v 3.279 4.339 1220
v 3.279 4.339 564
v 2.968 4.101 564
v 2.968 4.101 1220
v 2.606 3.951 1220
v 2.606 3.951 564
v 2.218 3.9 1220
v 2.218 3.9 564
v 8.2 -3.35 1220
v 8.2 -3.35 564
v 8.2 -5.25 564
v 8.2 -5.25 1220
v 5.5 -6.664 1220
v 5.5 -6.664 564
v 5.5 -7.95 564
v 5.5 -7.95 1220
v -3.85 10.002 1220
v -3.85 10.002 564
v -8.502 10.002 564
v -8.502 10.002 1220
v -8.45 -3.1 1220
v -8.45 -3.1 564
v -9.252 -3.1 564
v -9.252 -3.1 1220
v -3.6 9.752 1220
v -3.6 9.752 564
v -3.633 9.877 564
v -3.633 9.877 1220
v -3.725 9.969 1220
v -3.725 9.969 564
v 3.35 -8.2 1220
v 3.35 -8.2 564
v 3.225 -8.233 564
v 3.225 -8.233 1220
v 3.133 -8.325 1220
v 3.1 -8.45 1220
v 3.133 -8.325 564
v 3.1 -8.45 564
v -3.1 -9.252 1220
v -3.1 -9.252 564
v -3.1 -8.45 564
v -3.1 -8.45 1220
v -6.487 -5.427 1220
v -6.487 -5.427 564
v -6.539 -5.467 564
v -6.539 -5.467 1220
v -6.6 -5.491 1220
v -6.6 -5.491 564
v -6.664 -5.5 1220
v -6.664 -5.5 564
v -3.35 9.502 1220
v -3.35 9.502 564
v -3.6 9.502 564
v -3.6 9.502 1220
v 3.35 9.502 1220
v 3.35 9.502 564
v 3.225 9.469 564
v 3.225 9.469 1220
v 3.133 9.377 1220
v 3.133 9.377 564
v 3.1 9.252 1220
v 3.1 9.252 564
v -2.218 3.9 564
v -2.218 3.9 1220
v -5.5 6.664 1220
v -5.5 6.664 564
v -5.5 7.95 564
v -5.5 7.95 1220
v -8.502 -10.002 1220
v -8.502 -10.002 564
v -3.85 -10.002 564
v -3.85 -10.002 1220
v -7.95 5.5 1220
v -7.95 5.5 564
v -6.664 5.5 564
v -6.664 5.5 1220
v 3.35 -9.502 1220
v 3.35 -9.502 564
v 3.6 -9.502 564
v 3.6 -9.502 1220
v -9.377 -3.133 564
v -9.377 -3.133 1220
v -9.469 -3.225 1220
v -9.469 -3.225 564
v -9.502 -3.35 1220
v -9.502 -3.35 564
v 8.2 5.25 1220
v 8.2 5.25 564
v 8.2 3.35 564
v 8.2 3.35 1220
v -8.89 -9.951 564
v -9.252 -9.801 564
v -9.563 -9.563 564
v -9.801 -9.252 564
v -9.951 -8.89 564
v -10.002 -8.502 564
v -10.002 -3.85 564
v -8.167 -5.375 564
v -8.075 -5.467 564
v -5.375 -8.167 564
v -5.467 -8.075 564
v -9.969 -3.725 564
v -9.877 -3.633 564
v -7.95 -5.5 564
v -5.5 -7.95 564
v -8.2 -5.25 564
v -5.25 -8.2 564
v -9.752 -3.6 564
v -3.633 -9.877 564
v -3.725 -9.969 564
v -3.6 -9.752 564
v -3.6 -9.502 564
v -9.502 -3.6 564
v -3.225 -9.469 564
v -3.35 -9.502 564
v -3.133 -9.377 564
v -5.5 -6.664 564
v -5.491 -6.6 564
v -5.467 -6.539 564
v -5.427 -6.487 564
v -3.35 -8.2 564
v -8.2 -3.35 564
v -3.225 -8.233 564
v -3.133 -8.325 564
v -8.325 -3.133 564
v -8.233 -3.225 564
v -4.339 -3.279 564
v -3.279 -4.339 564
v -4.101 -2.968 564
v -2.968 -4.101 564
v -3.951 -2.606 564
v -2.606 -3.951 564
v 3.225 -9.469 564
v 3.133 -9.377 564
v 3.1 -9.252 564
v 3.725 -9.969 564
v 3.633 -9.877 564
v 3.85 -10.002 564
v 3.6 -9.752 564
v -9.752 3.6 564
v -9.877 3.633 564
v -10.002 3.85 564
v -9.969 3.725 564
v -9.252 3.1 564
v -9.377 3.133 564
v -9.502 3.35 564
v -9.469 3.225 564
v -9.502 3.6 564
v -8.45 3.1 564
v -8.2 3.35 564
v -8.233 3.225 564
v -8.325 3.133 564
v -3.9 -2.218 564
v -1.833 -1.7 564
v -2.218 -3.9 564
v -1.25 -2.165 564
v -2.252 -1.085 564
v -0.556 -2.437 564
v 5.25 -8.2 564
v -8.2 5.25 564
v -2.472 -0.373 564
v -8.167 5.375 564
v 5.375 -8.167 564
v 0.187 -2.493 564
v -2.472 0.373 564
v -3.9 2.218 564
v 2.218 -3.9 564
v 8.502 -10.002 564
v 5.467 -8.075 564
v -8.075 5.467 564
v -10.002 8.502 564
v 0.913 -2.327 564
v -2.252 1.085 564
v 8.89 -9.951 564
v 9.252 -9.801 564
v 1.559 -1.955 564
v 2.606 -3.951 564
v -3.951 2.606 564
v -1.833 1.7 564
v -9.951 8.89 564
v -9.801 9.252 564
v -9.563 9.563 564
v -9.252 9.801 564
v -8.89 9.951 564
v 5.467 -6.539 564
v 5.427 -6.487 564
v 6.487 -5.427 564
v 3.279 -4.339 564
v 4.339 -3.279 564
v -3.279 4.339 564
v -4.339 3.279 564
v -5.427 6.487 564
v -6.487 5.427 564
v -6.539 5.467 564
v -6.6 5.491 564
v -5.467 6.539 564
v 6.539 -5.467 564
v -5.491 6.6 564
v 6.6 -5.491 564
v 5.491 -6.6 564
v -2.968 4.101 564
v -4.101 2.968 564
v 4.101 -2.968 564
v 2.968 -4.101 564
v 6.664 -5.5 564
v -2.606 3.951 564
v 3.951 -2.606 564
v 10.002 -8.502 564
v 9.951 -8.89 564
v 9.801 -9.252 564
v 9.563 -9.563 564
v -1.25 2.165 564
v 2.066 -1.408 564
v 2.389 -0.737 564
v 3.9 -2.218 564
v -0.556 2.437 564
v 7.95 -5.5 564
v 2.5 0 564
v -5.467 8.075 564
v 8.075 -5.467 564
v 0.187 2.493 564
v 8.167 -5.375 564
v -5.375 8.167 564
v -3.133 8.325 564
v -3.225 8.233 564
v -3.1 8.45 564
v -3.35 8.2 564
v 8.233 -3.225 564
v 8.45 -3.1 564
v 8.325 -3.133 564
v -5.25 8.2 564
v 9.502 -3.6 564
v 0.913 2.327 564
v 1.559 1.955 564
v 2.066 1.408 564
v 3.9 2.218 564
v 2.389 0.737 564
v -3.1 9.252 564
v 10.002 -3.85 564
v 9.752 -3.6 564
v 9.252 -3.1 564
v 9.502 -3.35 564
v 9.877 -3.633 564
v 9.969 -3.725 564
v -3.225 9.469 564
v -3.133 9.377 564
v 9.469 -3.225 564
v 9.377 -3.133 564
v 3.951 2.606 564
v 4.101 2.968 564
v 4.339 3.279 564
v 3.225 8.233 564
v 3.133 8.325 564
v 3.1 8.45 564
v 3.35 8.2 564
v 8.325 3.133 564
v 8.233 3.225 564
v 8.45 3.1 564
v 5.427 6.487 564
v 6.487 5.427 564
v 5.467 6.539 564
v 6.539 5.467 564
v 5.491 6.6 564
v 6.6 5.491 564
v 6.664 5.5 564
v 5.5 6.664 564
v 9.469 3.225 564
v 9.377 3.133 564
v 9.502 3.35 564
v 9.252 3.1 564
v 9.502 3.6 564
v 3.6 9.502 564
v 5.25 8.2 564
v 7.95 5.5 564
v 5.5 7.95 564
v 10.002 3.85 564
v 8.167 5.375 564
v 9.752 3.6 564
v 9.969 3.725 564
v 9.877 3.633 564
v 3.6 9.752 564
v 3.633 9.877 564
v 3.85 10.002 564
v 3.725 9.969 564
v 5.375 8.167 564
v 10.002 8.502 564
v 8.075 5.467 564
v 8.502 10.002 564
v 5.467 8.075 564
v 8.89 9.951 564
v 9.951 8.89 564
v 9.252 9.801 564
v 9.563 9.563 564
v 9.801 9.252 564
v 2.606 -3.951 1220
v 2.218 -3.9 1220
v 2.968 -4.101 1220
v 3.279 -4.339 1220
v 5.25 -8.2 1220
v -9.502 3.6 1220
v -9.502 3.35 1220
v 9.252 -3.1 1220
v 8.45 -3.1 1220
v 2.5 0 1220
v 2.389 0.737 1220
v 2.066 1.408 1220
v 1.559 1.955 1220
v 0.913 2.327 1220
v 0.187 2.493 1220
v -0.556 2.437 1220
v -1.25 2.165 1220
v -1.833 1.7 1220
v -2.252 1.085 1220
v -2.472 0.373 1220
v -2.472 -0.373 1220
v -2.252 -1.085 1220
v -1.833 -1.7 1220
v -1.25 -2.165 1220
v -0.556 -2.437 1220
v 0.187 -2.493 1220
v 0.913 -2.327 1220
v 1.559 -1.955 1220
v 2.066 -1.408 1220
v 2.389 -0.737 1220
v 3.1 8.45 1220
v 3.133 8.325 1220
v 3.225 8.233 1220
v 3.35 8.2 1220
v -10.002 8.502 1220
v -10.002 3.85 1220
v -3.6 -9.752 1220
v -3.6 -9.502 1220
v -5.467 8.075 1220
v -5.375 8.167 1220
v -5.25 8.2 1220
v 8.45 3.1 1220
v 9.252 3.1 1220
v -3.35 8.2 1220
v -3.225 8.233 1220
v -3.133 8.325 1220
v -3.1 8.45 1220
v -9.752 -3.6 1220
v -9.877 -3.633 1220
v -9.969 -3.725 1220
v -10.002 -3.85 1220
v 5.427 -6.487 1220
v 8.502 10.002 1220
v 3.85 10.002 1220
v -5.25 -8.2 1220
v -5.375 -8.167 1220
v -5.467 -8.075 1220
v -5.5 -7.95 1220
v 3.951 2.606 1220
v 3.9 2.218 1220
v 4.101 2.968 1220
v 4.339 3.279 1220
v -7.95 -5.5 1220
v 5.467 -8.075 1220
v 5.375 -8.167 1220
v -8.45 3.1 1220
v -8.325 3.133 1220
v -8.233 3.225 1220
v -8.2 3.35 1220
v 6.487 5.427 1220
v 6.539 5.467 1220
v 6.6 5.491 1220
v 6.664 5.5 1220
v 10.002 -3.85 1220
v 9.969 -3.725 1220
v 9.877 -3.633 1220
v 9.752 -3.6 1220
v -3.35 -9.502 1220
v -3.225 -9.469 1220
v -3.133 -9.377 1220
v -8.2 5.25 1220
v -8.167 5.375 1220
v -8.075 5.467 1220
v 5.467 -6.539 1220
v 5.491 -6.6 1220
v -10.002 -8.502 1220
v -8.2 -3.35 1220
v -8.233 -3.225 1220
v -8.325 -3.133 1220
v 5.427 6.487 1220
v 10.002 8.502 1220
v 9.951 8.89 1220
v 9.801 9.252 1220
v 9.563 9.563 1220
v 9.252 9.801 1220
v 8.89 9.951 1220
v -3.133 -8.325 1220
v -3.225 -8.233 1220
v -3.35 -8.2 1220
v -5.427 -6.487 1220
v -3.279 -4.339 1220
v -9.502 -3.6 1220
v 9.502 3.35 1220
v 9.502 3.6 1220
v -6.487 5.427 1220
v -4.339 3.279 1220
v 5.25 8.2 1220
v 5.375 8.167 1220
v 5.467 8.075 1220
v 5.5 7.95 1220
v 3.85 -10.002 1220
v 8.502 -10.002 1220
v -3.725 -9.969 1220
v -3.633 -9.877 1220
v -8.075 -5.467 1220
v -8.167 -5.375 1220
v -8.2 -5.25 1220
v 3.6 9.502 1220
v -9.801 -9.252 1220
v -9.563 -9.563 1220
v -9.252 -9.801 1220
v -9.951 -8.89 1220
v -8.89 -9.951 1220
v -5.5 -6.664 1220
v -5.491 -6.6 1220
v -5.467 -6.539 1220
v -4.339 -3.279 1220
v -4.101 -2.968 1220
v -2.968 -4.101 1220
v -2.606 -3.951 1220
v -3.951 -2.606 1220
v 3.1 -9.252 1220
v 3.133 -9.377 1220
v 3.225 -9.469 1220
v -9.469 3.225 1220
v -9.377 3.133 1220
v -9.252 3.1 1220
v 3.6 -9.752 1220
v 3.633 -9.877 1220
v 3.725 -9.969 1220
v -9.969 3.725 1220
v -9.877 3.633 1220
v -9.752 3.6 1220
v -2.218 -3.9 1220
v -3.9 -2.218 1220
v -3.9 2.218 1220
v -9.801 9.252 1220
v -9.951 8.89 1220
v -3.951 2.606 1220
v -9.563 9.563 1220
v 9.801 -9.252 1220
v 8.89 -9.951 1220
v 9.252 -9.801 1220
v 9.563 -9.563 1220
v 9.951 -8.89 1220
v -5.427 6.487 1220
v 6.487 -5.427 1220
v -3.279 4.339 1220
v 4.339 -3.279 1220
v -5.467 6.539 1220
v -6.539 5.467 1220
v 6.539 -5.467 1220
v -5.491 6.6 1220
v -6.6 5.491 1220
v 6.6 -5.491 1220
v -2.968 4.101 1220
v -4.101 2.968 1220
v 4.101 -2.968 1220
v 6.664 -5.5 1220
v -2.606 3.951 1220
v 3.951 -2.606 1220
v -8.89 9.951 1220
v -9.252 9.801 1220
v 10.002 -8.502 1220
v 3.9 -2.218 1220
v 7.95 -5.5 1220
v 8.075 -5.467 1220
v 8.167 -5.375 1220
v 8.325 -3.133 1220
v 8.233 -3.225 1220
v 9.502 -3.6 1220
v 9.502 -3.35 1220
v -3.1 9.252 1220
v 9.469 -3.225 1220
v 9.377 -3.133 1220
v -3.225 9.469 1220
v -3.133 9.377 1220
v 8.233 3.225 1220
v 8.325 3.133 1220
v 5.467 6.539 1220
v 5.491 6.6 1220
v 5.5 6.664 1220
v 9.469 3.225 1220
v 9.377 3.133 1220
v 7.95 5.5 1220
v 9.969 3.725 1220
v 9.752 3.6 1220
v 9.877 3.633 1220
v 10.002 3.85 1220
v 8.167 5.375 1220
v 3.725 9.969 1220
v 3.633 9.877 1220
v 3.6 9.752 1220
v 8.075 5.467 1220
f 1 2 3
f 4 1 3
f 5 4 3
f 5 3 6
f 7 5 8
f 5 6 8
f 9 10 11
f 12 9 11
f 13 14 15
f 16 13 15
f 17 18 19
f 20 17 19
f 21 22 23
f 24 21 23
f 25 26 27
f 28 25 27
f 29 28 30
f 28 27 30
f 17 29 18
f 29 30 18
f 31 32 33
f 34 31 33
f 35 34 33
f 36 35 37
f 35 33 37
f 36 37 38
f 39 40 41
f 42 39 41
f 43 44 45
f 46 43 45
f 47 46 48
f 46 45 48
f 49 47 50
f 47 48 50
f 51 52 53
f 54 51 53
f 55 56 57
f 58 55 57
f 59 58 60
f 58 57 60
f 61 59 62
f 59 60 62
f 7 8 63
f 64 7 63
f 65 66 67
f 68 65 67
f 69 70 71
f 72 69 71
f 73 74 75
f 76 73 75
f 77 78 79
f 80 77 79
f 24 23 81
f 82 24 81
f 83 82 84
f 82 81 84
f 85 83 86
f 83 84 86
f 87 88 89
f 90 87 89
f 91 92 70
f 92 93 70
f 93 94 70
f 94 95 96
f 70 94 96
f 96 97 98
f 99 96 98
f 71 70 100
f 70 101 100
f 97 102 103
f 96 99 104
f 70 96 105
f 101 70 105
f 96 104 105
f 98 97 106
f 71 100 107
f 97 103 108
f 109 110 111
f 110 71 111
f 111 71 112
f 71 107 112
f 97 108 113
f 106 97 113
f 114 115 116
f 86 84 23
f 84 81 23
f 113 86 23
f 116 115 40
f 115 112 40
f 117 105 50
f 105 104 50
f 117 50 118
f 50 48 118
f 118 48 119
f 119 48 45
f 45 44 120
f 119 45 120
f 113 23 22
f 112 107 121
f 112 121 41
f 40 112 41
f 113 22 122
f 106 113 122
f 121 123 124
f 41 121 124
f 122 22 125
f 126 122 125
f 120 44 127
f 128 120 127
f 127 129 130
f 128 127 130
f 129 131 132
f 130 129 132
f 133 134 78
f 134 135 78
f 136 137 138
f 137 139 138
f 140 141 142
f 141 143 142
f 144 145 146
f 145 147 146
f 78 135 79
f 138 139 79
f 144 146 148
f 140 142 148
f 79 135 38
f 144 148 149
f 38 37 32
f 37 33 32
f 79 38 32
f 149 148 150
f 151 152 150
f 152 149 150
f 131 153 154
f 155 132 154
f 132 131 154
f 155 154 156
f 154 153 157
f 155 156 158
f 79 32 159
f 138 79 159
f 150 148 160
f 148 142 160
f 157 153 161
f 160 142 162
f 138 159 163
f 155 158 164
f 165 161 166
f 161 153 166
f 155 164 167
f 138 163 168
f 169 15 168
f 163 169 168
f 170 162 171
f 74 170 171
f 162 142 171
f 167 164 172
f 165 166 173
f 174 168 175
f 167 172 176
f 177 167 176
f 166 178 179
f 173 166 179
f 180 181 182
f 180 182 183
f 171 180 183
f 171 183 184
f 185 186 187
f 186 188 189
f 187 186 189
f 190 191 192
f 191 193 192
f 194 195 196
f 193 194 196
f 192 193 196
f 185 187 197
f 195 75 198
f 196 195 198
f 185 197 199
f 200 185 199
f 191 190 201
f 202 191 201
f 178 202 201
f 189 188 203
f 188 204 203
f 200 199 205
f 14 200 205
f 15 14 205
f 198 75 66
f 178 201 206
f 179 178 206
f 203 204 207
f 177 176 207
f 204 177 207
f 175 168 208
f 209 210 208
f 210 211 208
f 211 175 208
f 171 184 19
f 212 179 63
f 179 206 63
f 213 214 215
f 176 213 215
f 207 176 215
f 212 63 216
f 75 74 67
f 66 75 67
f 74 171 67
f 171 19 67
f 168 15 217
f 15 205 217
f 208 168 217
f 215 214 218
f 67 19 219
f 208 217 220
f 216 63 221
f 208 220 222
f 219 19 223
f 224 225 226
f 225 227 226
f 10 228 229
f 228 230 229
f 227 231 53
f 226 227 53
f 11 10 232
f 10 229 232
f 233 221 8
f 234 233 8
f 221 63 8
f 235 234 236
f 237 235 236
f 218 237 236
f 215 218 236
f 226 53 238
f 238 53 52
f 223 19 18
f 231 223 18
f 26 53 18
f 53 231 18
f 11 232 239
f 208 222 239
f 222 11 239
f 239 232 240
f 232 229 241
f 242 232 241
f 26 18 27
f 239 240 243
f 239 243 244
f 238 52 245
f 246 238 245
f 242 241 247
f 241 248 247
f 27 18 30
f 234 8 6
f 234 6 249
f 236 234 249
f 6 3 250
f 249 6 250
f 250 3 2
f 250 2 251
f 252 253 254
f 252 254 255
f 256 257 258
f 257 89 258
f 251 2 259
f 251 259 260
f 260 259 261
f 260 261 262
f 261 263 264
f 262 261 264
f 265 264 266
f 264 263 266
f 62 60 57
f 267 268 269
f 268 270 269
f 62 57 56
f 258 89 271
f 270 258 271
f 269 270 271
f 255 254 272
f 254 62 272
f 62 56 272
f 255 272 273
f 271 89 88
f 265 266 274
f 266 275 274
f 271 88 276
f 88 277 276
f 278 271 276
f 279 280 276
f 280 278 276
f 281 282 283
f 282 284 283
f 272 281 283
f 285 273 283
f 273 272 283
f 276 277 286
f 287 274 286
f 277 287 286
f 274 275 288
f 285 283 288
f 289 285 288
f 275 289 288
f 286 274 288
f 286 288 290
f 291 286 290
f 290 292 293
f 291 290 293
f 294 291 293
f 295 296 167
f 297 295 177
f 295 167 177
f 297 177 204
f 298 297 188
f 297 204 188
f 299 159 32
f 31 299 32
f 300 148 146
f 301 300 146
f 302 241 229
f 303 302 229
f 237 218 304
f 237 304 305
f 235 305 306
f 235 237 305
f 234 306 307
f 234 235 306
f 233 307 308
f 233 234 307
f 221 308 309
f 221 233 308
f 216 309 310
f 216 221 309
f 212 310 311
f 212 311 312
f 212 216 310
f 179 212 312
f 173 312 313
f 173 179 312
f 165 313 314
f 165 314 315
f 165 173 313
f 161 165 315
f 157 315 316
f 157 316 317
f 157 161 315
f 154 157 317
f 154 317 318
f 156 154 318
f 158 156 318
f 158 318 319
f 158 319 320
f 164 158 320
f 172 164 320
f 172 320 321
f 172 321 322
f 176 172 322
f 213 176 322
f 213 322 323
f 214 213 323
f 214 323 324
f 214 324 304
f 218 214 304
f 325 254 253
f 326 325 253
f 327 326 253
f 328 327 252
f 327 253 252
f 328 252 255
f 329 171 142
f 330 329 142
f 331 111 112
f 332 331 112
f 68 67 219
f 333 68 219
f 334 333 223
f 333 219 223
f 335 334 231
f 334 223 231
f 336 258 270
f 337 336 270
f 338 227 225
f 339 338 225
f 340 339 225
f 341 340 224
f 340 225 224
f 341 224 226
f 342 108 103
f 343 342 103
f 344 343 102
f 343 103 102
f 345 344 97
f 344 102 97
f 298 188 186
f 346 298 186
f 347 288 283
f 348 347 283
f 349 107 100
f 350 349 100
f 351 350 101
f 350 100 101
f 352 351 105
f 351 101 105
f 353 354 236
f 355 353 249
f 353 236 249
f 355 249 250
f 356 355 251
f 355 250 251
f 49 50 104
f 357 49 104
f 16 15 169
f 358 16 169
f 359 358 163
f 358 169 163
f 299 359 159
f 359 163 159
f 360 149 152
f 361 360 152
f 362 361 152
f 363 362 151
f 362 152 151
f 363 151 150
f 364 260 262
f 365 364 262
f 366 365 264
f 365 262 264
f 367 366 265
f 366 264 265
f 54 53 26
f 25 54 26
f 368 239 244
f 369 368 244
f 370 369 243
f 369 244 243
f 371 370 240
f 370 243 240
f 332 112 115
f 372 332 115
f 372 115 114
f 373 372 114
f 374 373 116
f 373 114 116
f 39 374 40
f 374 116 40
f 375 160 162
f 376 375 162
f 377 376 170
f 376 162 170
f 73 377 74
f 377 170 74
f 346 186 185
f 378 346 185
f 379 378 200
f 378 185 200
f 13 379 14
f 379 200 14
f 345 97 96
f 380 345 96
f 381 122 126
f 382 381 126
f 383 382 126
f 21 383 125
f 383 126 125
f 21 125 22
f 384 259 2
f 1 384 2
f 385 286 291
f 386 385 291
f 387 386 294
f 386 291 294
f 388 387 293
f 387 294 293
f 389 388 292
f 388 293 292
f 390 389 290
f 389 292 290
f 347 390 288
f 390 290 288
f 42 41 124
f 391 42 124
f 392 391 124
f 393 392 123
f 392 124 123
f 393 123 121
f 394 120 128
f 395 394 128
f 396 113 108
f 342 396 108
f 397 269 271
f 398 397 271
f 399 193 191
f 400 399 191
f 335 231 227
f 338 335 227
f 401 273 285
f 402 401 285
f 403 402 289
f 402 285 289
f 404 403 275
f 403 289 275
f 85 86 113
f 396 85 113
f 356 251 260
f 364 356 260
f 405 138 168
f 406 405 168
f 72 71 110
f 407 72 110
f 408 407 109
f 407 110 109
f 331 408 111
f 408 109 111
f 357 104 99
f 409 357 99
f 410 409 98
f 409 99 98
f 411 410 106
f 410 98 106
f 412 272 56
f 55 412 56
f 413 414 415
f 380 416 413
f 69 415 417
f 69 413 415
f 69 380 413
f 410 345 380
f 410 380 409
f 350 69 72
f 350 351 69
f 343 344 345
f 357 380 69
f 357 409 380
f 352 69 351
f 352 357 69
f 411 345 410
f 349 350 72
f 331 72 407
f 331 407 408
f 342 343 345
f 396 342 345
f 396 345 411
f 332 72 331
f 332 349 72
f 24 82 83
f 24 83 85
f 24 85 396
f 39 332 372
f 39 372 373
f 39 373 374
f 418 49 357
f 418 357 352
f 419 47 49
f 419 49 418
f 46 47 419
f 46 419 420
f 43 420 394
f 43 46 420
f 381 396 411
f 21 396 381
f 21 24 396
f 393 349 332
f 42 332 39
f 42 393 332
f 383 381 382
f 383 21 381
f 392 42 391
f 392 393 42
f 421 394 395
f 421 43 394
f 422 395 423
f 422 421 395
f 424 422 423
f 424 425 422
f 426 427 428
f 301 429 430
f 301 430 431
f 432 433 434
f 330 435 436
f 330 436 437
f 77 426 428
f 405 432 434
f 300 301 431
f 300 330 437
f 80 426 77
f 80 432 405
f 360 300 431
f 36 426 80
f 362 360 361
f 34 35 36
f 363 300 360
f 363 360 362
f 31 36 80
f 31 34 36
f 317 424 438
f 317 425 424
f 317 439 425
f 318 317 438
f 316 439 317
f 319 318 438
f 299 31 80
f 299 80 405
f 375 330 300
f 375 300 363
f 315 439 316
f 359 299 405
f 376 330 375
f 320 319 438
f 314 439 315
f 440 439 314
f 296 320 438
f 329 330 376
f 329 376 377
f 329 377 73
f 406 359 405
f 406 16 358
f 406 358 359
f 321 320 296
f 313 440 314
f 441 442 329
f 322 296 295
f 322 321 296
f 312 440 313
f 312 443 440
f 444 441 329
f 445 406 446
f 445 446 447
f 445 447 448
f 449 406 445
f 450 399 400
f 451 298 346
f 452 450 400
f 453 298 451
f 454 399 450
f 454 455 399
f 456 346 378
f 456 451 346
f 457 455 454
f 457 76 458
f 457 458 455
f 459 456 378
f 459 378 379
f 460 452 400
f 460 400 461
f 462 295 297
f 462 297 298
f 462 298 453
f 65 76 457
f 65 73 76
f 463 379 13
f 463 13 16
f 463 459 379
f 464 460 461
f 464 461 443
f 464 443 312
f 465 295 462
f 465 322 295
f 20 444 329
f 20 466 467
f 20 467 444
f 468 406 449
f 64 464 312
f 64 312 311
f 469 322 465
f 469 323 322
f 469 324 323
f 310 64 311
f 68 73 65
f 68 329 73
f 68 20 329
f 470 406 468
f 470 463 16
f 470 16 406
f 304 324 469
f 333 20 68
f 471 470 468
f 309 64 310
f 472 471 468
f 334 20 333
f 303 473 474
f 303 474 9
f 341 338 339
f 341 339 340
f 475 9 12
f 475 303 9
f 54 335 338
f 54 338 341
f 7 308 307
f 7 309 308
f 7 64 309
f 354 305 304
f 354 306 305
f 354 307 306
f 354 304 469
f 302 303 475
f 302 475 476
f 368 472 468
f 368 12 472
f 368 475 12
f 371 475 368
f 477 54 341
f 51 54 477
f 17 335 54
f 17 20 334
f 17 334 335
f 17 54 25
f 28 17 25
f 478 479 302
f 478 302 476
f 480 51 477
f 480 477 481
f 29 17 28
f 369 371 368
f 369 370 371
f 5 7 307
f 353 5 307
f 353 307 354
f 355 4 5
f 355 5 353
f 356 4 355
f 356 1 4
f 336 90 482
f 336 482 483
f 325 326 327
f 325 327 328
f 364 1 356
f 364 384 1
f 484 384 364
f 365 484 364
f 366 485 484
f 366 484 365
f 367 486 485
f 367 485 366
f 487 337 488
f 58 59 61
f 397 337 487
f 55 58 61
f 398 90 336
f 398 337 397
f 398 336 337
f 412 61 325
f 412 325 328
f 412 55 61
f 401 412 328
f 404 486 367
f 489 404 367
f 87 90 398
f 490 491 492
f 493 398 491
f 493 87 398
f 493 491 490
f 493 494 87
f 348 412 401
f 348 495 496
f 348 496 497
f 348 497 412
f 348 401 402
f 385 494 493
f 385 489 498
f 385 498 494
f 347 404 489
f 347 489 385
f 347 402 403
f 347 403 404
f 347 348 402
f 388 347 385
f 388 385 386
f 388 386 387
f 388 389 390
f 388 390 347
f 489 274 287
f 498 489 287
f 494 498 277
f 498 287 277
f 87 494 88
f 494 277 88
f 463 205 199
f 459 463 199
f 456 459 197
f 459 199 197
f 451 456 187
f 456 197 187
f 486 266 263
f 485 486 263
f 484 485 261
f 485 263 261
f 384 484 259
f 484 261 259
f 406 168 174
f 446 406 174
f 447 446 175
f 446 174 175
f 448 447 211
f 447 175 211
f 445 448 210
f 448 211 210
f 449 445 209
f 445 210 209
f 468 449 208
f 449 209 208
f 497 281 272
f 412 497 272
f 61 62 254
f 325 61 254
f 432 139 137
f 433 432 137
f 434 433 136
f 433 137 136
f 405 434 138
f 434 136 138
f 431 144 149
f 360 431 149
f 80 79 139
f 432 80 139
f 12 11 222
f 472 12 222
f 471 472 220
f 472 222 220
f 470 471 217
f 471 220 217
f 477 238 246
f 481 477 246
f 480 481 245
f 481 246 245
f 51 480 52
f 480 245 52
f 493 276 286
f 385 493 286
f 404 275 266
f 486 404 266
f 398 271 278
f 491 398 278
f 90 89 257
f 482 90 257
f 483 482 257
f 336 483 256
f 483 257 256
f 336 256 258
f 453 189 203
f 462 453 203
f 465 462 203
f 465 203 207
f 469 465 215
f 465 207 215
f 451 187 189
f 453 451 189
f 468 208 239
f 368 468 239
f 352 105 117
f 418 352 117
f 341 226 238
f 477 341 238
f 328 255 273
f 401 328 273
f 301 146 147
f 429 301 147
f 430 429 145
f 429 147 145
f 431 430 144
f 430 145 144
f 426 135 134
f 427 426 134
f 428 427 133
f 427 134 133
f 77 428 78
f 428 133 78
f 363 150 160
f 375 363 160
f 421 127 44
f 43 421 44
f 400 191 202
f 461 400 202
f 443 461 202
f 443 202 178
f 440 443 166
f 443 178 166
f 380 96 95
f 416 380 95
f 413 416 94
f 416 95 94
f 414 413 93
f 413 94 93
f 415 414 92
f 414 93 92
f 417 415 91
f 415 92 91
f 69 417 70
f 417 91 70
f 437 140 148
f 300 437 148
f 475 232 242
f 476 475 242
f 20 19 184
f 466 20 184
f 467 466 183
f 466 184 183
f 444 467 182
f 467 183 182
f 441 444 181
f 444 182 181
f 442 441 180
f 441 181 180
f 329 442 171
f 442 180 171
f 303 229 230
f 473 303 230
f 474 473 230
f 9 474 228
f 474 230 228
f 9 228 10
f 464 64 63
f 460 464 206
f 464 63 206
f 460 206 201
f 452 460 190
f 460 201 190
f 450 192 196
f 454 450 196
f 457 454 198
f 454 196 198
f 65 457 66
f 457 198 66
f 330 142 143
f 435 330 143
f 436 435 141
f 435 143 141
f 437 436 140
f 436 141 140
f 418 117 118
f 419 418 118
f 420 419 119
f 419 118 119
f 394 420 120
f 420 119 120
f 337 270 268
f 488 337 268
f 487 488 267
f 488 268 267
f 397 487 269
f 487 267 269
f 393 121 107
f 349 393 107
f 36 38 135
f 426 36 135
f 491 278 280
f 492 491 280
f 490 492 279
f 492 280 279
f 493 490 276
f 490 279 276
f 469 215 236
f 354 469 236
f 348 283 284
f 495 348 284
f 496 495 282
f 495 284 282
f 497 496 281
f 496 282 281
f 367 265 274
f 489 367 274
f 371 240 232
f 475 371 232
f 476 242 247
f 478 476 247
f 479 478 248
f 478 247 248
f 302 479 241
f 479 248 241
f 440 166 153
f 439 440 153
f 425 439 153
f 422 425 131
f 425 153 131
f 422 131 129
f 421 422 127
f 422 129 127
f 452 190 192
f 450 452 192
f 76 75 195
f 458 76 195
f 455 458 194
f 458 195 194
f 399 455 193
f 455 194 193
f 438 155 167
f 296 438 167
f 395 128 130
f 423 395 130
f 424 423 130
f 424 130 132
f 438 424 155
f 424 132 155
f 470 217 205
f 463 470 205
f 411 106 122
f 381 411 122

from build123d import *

# Parameters (mm, degrees)
SKETCH_1_R         = 2.5
EXTRUDE_1_DEPTH    = 1220
SKETCH1_R          = 16.771487081
CUT_EXTRUDE1_DEPTH = 565


with BuildPart() as part:
    # 草图1 → 凸台-拉伸1 (new body)
    with BuildSketch(Plane.XY):
        with BuildLine():
            Line((-8.502261885, -10.002261885), (-3.85, -10.002261885))
            ThreePointArc((-3.85, -10.002261885), (-3.673223305, -9.929038581), (-3.6, -9.752261885))
            Line((-3.6, -9.752261885), (-3.6, -9.502261885))
            Line((-3.6, -9.502261885), (-3.35, -9.502261885))
            ThreePointArc((-3.35, -9.502261885), (-3.173223305, -9.429038581), (-3.1, -9.252261885))
            Line((-3.1, -9.252261885), (-3.1, -8.45))
            ThreePointArc((-3.1, -8.45), (-3.173223305, -8.273223305), (-3.35, -8.2))
            Line((-3.35, -8.2), (-5.25, -8.2))
            ThreePointArc((-5.25, -8.2), (-5.426776695, -8.126776695), (-5.5, -7.95))
            Line((-5.5, -7.95), (-5.5, -6.664213562))
            ThreePointArc((-5.5, -6.664213562), (-5.480969883, -6.568542704), (-5.426776695, -6.487436867))
            Line((-5.426776695, -6.487436867), (-3.278679656, -4.339339828))
            ThreePointArc((-3.278679656, -4.339339828), (-2.792044633, -4.014180701), (-2.218019485, -3.9))
            Line((-2.218019485, -3.9), (2.218019485, -3.9))
            ThreePointArc((2.218019485, -3.9), (2.792044633, -4.014180701), (3.278679656, -4.339339828))
            Line((3.278679656, -4.339339828), (5.426776695, -6.487436867))
            ThreePointArc((5.426776695, -6.487436867), (5.480969883, -6.568542704), (5.5, -6.664213562))
            Line((5.5, -6.664213562), (5.5, -7.95))
            ThreePointArc((5.5, -7.95), (5.426776695, -8.126776695), (5.25, -8.2))
            Line((5.25, -8.2), (3.35, -8.2))
            ThreePointArc((3.35, -8.2), (3.173223305, -8.273223305), (3.1, -8.45))
            Line((3.1, -8.45), (3.1, -9.252261885))
            ThreePointArc((3.1, -9.252261885), (3.173223305, -9.429038581), (3.35, -9.502261885))
            Line((3.35, -9.502261885), (3.6, -9.502261885))
            Line((3.6, -9.502261885), (3.6, -9.752261885))
            ThreePointArc((3.6, -9.752261885), (3.673223305, -9.929038581), (3.85, -10.002261885))
            Line((3.85, -10.002261885), (8.502261885, -10.002261885))
            ThreePointArc((8.502261885, -10.002261885), (9.562922057, -9.562922057), (10.002261885, -8.502261885))
            Line((10.002261885, -8.502261885), (10.002261885, -3.85))
            ThreePointArc((10.002261885, -3.85), (9.929038581, -3.673223305), (9.752261885, -3.6))
            Line((9.752261885, -3.6), (9.502261885, -3.6))
            Line((9.502261885, -3.6), (9.502261885, -3.35))
            ThreePointArc((9.502261885, -3.35), (9.429038581, -3.173223305), (9.252261885, -3.1))
            Line((9.252261885, -3.1), (8.45, -3.1))
            ThreePointArc((8.45, -3.1), (8.273223305, -3.173223305), (8.2, -3.35))
            Line((8.2, -3.35), (8.2, -5.25))
            ThreePointArc((8.2, -5.25), (8.126776695, -5.426776695), (7.95, -5.5))
            Line((7.95, -5.5), (6.664213562, -5.5))
            ThreePointArc((6.664213562, -5.5), (6.568542704, -5.480969883), (6.487436867, -5.426776695))
            Line((6.487436867, -5.426776695), (4.339339828, -3.278679656))
            ThreePointArc((4.339339828, -3.278679656), (4.014180701, -2.792044633), (3.9, -2.218019485))
            Line((3.9, -2.218019485), (3.9, 2.218019485))
            ThreePointArc((3.9, 2.218019485), (4.014180701, 2.792044633), (4.339339828, 3.278679656))
            Line((4.339339828, 3.278679656), (6.487436867, 5.426776695))
            ThreePointArc((6.487436867, 5.426776695), (6.568542704, 5.480969883), (6.664213562, 5.5))
            Line((6.664213562, 5.5), (7.95, 5.5))
            ThreePointArc((7.95, 5.5), (8.126776695, 5.426776695), (8.2, 5.25))
            Line((8.2, 5.25), (8.2, 3.35))
            ThreePointArc((8.2, 3.35), (8.273223305, 3.173223305), (8.45, 3.1))
            Line((8.45, 3.1), (9.252261885, 3.1))
            ThreePointArc((9.252261885, 3.1), (9.429038581, 3.173223305), (9.502261885, 3.35))
            Line((9.502261885, 3.35), (9.502261885, 3.6))
            Line((9.502261885, 3.6), (9.752261885, 3.6))
            ThreePointArc((9.752261885, 3.6), (9.929038581, 3.673223305), (10.002261885, 3.85))
            Line((10.002261885, 3.85), (10.002261885, 8.502261885))
            ThreePointArc((10.002261885, 8.502261885), (9.562922057, 9.562922057), (8.502261885, 10.002261885))
            Line((8.502261885, 10.002261885), (3.85, 10.002261885))
            ThreePointArc((3.85, 10.002261885), (3.673223305, 9.929038581), (3.6, 9.752261885))
            Line((3.6, 9.752261885), (3.6, 9.502261885))
            Line((3.6, 9.502261885), (3.35, 9.502261885))
            ThreePointArc((3.35, 9.502261885), (3.173223305, 9.429038581), (3.1, 9.252261885))
            Line((3.1, 9.252261885), (3.1, 8.45))
            ThreePointArc((3.1, 8.45), (3.173223305, 8.273223305), (3.35, 8.2))
            Line((3.35, 8.2), (5.25, 8.2))
            ThreePointArc((5.25, 8.2), (5.426776695, 8.126776695), (5.5, 7.95))
            Line((5.5, 7.95), (5.5, 6.664213562))
            ThreePointArc((5.5, 6.664213562), (5.480969883, 6.568542704), (5.426776695, 6.487436867))
            Line((5.426776695, 6.487436867), (3.278679656, 4.339339828))
            ThreePointArc((3.278679656, 4.339339828), (2.792044633, 4.014180701), (2.218019485, 3.9))
            Line((2.218019485, 3.9), (-2.218019485, 3.9))
            ThreePointArc((-2.218019485, 3.9), (-2.792044633, 4.014180701), (-3.278679656, 4.339339828))
            Line((-3.278679656, 4.339339828), (-5.426776695, 6.487436867))
            ThreePointArc((-5.426776695, 6.487436867), (-5.480969883, 6.568542704), (-5.5, 6.664213562))
            Line((-5.5, 6.664213562), (-5.5, 7.95))
            ThreePointArc((-5.5, 7.95), (-5.426776695, 8.126776695), (-5.25, 8.2))
            Line((-5.25, 8.2), (-3.35, 8.2))
            ThreePointArc((-3.35, 8.2), (-3.173223305, 8.273223305), (-3.1, 8.45))
            Line((-3.1, 8.45), (-3.1, 9.252261885))
            ThreePointArc((-3.1, 9.252261885), (-3.173223305, 9.429038581), (-3.35, 9.502261885))
            Line((-3.35, 9.502261885), (-3.6, 9.502261885))
            Line((-3.6, 9.502261885), (-3.6, 9.752261885))
            ThreePointArc((-3.6, 9.752261885), (-3.673223305, 9.929038581), (-3.85, 10.002261885))
            Line((-3.85, 10.002261885), (-8.502261885, 10.002261885))
            ThreePointArc((-8.502261885, 10.002261885), (-9.562922057, 9.562922057), (-10.002261885, 8.502261885))
            Line((-10.002261885, 8.502261885), (-10.002261885, 3.85))
            ThreePointArc((-10.002261885, 3.85), (-9.929038581, 3.673223305), (-9.752261885, 3.6))
            Line((-9.752261885, 3.6), (-9.502261885, 3.6))
            Line((-9.502261885, 3.6), (-9.502261885, 3.35))
            ThreePointArc((-9.502261885, 3.35), (-9.429038581, 3.173223305), (-9.252261885, 3.1))
            Line((-9.252261885, 3.1), (-8.45, 3.1))
            ThreePointArc((-8.45, 3.1), (-8.273223305, 3.173223305), (-8.2, 3.35))
            Line((-8.2, 3.35), (-8.2, 5.25))
            ThreePointArc((-8.2, 5.25), (-8.126776695, 5.426776695), (-7.95, 5.5))
            Line((-7.95, 5.5), (-6.664213562, 5.5))
            ThreePointArc((-6.664213562, 5.5), (-6.568542704, 5.480969883), (-6.487436867, 5.426776695))
            Line((-6.487436867, 5.426776695), (-4.339339828, 3.278679656))
            ThreePointArc((-4.339339828, 3.278679656), (-4.014180701, 2.792044633), (-3.9, 2.218019485))
            Line((-3.9, 2.218019485), (-3.9, -2.218019485))
            ThreePointArc((-3.9, -2.218019485), (-4.014180701, -2.792044633), (-4.339339828, -3.278679656))
            Line((-4.339339828, -3.278679656), (-6.487436867, -5.426776695))
            ThreePointArc((-6.487436867, -5.426776695), (-6.568542704, -5.480969883), (-6.664213562, -5.5))
            Line((-6.664213562, -5.5), (-7.95, -5.5))
            ThreePointArc((-7.95, -5.5), (-8.126776695, -5.426776695), (-8.2, -5.25))
            Line((-8.2, -5.25), (-8.2, -3.35))
            ThreePointArc((-8.2, -3.35), (-8.273223305, -3.173223305), (-8.45, -3.1))
            Line((-8.45, -3.1), (-9.252261885, -3.1))
            ThreePointArc((-9.252261885, -3.1), (-9.429038581, -3.173223305), (-9.502261885, -3.35))
            Line((-9.502261885, -3.35), (-9.502261885, -3.6))
            Line((-9.502261885, -3.6), (-9.752261885, -3.6))
            ThreePointArc((-9.752261885, -3.6), (-9.929038581, -3.673223305), (-10.002261885, -3.85))
            Line((-10.002261885, -3.85), (-10.002261885, -8.502261885))
            ThreePointArc((-10.002261885, -8.502261885), (-9.562922057, -9.562922057), (-8.502261885, -10.002261885))
        make_face()
        Circle(SKETCH_1_R, mode=Mode.SUBTRACT)
    extrude(amount=EXTRUDE_1_DEPTH)

    # Sketch1 → Cut-Extrude1 (cut, through all)
    with BuildSketch(Plane.XY.offset(564)):
        Circle(SKETCH1_R)
    extrude(amount=-CUT_EXTRUDE1_DEPTH, mode=Mode.SUBTRACT)


solid = part.part
